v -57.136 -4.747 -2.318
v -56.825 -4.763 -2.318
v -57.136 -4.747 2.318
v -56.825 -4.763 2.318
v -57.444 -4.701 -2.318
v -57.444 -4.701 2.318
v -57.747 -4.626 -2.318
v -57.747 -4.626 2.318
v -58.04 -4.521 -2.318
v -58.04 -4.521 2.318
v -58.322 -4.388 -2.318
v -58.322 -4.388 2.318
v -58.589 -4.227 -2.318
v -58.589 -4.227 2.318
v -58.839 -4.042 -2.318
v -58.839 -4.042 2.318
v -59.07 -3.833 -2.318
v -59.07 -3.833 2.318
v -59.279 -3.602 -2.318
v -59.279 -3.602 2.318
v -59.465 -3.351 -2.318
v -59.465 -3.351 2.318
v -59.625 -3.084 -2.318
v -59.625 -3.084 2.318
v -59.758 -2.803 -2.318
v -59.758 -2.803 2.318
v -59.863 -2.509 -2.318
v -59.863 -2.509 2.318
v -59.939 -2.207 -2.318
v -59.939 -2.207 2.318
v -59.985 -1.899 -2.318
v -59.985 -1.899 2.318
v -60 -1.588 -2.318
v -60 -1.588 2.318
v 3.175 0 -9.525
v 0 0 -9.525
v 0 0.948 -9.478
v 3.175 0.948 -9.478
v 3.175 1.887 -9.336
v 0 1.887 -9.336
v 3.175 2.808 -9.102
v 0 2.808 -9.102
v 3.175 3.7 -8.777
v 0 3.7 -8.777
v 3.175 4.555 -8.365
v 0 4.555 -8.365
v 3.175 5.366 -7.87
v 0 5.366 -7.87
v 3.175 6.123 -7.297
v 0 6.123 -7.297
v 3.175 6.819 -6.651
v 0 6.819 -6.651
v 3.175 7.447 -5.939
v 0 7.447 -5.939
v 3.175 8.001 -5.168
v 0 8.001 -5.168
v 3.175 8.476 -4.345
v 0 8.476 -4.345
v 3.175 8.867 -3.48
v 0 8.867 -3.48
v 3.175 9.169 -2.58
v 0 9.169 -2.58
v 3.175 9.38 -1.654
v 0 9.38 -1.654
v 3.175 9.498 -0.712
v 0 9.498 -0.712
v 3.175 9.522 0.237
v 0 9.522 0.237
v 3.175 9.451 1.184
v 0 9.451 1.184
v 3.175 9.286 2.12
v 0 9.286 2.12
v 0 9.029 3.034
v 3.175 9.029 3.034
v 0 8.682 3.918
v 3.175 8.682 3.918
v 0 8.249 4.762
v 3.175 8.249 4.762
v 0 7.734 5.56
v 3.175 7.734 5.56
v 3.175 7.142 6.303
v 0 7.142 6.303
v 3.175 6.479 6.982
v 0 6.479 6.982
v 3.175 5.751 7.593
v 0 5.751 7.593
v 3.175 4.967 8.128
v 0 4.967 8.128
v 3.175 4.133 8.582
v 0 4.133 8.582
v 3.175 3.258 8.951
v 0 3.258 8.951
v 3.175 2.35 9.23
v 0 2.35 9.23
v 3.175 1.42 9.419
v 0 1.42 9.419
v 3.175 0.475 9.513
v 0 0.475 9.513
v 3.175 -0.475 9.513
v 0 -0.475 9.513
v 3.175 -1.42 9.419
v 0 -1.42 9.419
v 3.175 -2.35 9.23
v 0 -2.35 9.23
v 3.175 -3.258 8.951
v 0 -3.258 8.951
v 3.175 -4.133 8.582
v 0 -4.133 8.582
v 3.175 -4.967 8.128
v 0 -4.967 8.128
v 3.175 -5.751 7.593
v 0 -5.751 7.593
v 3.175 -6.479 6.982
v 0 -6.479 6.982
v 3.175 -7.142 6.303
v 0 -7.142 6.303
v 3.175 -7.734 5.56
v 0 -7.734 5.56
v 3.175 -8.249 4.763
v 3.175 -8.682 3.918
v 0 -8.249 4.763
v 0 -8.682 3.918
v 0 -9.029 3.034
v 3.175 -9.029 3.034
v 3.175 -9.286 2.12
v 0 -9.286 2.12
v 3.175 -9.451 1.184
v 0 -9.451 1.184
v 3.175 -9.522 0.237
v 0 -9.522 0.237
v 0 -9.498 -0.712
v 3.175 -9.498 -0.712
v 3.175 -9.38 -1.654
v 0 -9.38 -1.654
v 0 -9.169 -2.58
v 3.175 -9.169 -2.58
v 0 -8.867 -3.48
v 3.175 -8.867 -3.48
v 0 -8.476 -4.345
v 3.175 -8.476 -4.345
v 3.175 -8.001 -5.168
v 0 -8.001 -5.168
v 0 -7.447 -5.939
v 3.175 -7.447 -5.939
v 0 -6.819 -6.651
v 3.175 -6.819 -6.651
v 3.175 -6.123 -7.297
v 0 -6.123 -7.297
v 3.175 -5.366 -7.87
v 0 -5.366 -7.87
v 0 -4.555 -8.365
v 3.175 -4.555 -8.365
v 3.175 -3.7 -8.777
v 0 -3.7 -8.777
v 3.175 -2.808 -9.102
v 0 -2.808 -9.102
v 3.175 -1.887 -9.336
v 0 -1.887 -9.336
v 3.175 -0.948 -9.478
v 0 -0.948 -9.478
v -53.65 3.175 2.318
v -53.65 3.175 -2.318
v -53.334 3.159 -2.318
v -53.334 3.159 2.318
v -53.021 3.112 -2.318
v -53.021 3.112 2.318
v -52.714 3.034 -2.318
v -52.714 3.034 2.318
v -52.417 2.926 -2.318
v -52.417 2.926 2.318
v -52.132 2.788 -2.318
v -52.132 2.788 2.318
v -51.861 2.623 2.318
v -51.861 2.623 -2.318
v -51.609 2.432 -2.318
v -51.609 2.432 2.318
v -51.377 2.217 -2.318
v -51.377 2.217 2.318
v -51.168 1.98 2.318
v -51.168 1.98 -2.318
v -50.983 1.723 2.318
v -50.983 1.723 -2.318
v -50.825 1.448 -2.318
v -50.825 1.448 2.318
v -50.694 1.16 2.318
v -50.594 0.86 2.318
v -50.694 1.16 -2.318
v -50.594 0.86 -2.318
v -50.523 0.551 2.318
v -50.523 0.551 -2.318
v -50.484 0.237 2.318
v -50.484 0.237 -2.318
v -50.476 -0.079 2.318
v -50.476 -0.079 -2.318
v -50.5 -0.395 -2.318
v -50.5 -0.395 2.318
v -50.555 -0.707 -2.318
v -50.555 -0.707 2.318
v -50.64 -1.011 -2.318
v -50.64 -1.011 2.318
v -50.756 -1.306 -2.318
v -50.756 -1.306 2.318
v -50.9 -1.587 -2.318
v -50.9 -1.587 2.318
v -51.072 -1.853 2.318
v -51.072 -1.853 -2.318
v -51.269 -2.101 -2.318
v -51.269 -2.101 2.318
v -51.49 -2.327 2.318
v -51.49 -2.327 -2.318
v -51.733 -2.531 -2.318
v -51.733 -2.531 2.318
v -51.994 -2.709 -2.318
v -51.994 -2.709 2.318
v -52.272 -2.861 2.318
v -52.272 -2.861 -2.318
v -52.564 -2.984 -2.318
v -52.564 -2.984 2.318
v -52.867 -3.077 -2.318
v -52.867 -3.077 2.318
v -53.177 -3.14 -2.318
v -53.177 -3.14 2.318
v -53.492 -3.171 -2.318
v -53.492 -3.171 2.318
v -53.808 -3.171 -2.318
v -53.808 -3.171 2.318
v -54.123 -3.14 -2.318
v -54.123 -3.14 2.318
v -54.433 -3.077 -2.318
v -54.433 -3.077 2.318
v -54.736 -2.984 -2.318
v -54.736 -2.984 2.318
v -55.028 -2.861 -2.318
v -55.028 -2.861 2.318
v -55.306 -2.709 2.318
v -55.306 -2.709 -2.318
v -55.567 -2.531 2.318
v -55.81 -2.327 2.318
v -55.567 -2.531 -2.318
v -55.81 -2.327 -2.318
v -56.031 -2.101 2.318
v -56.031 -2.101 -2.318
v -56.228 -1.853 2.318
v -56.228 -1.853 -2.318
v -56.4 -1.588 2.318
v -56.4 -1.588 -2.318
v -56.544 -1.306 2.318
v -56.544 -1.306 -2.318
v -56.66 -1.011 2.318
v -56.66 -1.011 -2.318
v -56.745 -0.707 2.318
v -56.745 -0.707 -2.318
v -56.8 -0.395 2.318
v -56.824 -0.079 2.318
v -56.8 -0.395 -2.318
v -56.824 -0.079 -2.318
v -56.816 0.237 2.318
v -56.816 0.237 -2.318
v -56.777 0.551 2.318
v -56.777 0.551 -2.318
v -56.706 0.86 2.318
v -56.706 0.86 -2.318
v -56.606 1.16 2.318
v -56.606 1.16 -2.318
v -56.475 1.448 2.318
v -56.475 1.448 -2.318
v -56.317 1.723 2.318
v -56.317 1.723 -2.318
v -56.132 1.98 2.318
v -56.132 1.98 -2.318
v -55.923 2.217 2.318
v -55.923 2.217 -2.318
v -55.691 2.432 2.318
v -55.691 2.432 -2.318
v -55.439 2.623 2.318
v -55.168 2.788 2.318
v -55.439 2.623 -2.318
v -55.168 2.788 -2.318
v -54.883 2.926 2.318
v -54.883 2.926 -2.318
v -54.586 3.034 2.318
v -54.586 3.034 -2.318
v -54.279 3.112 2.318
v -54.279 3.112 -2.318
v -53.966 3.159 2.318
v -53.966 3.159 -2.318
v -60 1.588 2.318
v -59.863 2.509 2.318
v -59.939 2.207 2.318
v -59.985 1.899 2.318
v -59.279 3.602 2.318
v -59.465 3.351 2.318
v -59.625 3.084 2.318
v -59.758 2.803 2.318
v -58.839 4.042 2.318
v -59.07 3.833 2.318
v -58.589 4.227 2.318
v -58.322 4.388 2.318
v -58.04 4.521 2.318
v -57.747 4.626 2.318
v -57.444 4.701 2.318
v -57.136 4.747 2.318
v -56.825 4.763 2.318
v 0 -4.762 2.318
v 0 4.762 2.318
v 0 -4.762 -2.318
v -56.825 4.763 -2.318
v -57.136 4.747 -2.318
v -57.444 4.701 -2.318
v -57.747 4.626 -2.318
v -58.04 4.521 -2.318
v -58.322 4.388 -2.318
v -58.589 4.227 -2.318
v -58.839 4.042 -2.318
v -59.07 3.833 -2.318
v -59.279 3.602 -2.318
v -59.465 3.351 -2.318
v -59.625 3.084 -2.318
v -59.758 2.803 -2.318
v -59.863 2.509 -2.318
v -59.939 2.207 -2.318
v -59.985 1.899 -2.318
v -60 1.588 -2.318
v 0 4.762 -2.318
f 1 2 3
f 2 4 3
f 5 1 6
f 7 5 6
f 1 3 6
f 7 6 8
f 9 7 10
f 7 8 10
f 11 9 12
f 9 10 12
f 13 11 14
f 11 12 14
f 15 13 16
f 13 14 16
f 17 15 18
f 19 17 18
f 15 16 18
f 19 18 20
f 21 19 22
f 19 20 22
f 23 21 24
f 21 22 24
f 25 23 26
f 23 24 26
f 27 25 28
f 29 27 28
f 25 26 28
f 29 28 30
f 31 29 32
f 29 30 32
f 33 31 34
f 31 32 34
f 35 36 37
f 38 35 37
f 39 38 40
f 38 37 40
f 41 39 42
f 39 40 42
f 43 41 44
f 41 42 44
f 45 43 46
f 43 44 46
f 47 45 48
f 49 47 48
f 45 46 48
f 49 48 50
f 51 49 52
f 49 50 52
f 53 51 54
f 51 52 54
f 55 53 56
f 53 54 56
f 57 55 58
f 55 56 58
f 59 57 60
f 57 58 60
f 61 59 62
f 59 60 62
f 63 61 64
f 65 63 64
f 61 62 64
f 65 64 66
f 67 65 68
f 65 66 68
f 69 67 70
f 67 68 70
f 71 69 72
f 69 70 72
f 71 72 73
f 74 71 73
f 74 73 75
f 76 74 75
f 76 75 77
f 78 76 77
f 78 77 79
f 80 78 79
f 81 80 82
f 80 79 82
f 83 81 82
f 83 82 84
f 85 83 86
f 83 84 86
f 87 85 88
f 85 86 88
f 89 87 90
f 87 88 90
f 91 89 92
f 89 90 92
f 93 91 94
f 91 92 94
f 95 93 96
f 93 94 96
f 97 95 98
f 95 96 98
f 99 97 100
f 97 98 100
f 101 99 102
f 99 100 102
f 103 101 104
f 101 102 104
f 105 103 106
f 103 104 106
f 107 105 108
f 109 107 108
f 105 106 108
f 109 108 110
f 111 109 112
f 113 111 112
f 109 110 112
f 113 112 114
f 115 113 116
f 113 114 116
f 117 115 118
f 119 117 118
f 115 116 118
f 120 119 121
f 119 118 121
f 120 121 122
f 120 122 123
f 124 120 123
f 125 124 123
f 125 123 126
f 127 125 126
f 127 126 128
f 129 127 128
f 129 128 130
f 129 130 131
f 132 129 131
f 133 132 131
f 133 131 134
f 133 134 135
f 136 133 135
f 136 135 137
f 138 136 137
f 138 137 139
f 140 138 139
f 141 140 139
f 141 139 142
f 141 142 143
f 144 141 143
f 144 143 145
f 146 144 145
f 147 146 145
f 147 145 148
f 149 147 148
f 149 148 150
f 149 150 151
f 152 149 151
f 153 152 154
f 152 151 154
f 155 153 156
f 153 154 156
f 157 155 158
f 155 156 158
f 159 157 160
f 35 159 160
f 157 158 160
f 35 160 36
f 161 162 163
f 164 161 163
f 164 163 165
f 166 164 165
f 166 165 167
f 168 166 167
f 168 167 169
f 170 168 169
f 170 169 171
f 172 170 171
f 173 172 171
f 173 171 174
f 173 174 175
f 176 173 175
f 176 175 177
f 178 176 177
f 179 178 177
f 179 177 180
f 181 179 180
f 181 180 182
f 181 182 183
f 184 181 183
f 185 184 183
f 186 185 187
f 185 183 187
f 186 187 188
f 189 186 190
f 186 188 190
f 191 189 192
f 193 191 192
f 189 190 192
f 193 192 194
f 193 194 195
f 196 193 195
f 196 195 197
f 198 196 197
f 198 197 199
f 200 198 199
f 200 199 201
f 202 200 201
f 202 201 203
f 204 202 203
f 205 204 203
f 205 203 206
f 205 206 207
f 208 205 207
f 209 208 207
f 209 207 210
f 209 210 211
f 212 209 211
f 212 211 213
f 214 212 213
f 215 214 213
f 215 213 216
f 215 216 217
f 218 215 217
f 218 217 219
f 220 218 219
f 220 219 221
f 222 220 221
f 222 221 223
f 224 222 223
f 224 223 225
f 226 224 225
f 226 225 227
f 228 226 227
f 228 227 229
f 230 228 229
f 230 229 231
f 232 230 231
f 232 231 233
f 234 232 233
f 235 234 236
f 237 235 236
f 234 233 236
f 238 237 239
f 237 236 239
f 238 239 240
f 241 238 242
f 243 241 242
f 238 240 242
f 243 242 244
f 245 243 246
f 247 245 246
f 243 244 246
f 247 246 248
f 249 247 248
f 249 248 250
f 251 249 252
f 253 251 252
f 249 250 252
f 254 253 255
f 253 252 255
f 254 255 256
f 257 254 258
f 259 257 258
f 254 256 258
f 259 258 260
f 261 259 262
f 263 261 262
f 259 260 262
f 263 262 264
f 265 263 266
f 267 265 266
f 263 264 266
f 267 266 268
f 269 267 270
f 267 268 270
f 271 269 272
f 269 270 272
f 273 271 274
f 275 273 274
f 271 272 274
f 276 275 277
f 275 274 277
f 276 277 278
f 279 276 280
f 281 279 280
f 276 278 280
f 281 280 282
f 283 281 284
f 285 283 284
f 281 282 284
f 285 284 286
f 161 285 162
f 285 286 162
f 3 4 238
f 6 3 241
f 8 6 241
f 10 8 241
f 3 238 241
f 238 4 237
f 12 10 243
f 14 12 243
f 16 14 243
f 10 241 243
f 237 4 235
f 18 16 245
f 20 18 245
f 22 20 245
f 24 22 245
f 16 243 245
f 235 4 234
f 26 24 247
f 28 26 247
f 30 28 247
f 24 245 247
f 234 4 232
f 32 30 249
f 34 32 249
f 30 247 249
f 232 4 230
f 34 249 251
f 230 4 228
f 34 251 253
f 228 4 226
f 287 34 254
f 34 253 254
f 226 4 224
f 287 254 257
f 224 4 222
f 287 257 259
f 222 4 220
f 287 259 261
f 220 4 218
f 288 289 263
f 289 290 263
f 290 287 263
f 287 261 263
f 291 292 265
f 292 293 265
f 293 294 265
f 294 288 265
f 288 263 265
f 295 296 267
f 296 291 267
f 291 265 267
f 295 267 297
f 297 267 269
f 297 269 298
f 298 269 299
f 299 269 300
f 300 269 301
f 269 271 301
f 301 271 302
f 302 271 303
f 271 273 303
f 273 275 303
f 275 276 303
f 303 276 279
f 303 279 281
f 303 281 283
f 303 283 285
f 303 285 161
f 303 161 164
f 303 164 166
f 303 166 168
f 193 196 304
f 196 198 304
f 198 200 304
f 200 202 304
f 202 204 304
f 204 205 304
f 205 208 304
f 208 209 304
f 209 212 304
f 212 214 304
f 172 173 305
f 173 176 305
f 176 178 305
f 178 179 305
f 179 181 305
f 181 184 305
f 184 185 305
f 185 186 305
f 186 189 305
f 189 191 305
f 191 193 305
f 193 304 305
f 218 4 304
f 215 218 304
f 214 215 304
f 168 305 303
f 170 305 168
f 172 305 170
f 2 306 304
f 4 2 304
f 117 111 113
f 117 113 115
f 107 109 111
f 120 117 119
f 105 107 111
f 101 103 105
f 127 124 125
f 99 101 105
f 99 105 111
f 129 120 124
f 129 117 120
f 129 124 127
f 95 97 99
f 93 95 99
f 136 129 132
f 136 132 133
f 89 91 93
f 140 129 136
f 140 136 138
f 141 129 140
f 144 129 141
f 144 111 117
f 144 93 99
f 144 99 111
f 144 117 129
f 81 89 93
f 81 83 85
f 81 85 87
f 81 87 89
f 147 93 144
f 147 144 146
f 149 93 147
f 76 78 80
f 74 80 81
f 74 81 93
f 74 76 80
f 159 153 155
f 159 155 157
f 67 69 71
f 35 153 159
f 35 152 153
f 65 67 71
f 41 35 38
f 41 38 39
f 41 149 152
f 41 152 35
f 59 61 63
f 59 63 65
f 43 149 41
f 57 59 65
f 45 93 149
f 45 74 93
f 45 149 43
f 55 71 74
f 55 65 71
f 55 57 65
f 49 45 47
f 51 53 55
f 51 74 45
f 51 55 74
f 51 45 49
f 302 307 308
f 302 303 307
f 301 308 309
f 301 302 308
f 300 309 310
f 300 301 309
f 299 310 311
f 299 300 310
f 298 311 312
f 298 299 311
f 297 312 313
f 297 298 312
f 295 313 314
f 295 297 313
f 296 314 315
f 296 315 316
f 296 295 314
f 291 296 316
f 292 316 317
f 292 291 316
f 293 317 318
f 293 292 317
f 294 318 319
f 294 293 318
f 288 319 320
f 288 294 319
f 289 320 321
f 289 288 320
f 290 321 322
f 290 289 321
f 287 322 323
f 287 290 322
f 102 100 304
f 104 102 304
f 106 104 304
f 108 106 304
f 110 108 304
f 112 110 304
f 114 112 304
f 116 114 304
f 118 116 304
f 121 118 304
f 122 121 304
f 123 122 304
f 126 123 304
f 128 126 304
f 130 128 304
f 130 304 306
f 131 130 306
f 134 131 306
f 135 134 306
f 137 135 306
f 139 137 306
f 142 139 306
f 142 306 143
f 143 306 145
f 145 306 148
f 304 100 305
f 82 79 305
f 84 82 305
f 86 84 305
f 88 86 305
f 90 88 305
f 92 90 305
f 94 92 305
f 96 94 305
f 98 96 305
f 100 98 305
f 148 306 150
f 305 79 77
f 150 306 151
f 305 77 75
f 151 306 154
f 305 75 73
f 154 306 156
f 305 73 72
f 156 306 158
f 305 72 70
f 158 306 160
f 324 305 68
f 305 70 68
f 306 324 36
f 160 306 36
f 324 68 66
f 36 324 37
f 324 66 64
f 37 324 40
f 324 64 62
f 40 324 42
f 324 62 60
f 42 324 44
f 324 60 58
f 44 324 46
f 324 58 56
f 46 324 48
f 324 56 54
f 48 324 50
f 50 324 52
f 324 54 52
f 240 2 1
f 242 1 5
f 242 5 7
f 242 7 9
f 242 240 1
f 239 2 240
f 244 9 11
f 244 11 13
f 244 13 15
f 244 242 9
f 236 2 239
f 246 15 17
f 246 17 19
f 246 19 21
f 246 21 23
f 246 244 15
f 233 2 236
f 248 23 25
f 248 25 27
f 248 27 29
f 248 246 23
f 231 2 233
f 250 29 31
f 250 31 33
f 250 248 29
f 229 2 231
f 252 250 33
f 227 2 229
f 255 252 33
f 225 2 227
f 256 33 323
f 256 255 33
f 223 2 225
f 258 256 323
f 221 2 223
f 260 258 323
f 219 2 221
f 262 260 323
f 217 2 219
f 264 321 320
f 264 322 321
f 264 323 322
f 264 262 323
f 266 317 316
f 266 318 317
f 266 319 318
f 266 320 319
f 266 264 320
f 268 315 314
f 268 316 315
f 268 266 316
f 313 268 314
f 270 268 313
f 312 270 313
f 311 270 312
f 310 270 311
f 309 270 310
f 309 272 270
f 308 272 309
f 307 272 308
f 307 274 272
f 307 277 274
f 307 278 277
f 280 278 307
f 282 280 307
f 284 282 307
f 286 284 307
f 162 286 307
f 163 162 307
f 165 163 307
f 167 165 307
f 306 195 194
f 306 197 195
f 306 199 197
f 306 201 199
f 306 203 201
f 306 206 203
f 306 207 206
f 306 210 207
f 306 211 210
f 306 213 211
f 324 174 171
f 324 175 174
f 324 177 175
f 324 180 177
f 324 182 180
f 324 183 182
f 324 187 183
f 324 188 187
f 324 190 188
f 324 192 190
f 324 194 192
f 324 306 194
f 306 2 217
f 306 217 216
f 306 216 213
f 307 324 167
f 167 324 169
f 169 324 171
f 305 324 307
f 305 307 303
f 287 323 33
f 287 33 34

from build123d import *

# Parameters (mm, degrees)
SKETCH1_R           = 9.525
BOSS_EXTRUDE1_DEPTH = 3.175
SKETCH2_W           = 4.6355
SKETCH2_H           = 9.525
BOSS_EXTRUDE2_DEPTH = 60
FILLET1_R           = 3.175
SKETCH3_R           = 3.175
CUT_EXTRUDE1_DEPTH  = 62.894881473


with BuildPart() as part:
    # Sketch1 → Boss-Extrude1 (new body)
    with BuildSketch(Plane(origin=(0, 0, 0), x_dir=(0, 0, -1), z_dir=(1, 0, 0))):
        Circle(SKETCH1_R)
    extrude(amount=BOSS_EXTRUDE1_DEPTH)

    # Sketch2 → Boss-Extrude2 (add)
    with BuildSketch(Plane.ZY):
        Rectangle(SKETCH2_W, SKETCH2_H)
    extrude(amount=BOSS_EXTRUDE2_DEPTH)

    # Fillet1
    fillet1_edges = [part.edges().sort_by_distance(p)[0] for p in [
        (-60, 4.7625, 0),
        (-60, -4.7625, 0),
    ]]
    fillet(fillet1_edges, radius=FILLET1_R)

    # Sketch3 → Cut-Extrude1 (cut, through all)
    with BuildSketch(Plane(origin=(0, 0, -2.31775), x_dir=(-1, 0, 0), z_dir=(0, 0, -1))):
        with Locations(Location((53.65, 0, 0), (0, 0, 90))):
            Circle(SKETCH3_R)
    extrude(amount=-CUT_EXTRUDE1_DEPTH, mode=Mode.SUBTRACT)


solid = part.part
